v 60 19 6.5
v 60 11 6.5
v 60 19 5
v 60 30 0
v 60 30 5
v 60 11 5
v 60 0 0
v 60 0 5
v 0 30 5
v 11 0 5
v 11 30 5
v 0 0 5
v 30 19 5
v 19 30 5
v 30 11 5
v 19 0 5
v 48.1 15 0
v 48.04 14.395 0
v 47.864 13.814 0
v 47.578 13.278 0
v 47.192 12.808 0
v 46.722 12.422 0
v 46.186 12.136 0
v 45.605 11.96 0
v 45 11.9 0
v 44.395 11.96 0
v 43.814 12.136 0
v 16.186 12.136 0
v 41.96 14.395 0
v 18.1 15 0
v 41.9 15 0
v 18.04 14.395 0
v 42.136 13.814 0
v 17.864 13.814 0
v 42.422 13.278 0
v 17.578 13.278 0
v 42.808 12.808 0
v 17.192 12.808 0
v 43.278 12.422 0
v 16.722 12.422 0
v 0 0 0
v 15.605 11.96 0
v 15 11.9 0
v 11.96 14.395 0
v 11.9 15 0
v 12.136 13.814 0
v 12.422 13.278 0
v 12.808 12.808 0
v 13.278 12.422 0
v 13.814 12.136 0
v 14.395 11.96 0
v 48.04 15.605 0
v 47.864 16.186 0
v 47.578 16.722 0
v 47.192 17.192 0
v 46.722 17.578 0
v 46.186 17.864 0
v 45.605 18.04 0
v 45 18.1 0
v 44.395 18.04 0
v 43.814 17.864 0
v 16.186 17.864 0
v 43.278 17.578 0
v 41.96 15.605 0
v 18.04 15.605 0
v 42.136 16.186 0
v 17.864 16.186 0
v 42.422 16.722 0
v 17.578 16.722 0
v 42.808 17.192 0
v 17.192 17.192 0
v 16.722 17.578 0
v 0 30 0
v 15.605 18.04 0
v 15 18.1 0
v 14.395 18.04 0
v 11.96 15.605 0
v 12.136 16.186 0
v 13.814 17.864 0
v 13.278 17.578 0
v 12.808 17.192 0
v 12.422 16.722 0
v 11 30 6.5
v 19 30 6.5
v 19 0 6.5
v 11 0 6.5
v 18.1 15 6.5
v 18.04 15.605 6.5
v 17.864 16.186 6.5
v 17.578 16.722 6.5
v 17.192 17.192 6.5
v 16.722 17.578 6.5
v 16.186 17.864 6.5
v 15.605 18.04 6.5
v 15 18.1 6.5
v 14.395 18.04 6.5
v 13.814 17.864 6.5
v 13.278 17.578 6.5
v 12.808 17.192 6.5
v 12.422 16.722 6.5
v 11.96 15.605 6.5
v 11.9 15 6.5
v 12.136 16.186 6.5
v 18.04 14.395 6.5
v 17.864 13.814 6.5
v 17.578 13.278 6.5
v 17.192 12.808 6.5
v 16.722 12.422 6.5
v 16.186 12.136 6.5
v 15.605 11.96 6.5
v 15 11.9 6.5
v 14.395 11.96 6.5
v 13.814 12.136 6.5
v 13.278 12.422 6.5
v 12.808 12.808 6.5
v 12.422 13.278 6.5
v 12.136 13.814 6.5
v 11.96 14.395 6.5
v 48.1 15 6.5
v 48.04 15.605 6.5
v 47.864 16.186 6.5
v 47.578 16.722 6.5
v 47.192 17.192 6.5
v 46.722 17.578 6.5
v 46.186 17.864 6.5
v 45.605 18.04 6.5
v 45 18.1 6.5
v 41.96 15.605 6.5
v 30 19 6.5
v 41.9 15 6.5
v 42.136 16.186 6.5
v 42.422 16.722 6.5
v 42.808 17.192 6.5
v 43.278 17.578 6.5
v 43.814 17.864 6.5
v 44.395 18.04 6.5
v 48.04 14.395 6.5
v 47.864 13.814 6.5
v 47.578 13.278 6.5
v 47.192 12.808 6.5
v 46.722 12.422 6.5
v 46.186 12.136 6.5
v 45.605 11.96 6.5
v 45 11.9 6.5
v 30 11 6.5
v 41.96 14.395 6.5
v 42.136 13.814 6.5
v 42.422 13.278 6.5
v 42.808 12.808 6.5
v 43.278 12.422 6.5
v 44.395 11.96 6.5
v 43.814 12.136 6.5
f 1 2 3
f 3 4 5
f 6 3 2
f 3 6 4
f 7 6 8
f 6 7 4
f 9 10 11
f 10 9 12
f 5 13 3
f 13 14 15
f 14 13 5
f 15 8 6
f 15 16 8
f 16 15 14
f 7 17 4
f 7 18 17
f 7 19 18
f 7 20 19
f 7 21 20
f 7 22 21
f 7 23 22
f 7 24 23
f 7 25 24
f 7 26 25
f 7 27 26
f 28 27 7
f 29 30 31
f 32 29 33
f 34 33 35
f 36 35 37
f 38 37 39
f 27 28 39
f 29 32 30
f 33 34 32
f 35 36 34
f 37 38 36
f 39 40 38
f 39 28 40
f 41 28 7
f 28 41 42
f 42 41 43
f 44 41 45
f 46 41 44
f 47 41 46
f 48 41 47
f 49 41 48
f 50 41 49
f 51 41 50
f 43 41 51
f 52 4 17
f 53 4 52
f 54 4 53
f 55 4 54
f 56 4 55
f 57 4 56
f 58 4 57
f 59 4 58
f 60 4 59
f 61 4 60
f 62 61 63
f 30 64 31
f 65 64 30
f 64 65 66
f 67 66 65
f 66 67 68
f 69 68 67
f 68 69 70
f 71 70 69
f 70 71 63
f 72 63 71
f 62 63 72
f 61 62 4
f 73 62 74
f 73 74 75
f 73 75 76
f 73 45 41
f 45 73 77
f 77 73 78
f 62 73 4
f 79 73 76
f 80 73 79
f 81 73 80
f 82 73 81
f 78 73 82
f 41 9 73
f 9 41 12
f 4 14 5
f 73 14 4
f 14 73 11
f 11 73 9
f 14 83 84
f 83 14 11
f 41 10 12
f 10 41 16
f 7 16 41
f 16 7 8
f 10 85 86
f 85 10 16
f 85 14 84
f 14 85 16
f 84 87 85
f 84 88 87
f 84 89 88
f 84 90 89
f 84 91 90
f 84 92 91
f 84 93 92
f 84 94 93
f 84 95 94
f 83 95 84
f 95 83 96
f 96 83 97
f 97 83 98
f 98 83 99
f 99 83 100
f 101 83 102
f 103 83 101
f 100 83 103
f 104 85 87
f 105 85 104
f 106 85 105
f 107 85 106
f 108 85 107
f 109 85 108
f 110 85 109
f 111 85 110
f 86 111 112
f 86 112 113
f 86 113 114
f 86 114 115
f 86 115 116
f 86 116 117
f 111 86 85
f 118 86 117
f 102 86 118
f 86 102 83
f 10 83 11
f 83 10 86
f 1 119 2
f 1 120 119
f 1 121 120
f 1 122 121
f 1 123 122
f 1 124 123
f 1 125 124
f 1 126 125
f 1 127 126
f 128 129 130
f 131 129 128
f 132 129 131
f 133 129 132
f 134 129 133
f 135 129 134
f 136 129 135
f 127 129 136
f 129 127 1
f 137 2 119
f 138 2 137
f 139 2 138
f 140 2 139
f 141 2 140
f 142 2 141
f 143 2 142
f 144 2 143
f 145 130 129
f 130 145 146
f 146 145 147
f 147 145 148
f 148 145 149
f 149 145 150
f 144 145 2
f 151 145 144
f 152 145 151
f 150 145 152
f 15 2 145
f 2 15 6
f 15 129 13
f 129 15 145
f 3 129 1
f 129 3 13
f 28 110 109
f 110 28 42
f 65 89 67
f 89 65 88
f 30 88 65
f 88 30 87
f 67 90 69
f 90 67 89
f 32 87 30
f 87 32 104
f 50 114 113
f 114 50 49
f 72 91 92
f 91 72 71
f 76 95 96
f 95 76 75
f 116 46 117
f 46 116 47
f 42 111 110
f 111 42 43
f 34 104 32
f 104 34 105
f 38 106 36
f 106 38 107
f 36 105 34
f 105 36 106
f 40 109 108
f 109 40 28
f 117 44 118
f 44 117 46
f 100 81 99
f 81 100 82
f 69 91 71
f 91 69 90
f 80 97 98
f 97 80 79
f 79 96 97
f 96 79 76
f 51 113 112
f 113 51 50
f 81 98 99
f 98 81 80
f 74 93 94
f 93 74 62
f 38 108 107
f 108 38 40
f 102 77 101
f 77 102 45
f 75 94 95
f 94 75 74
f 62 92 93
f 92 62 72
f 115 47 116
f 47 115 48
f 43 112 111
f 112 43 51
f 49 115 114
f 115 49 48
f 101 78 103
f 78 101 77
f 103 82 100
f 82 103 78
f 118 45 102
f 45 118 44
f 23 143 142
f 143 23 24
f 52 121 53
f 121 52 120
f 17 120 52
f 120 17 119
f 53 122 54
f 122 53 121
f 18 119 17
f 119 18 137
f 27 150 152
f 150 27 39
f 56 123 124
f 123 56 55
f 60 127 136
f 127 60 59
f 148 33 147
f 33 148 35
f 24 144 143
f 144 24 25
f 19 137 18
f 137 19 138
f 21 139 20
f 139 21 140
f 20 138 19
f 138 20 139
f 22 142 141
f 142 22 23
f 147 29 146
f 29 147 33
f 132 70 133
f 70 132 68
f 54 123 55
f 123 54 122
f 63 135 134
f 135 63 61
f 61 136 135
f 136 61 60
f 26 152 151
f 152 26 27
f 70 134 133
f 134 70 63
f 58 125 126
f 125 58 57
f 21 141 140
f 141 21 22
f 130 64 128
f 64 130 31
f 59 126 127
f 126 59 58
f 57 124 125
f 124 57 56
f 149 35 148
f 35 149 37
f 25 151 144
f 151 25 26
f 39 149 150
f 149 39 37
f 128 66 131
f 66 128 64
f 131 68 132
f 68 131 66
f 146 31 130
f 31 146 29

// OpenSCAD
// RebeliX
//
// corner clutch
// GNU GPL v3
// Martin Neruda <neruda@reprap4u.cz>
// http://www.reprap4u.cz
// Inspired by Rebel II

// Postacuji i 4 mm
base_thickness = 5;

difference(){
	union(){
		cube([60,30,base_thickness], center = false);
		translate([11,0,0])cube([8,30,base_thickness+1.5]);
		translate([60,30/2-4,0])rotate(90,0,0)cube([8,30,base_thickness+1.5]);
		}
		
		translate([11+4,30/2,-0.1])cylinder(h=10,r=3.1,$fn=32);
		translate([60-30/2,30/2,-0.1])cylinder(h=10,r=3.1,$fn=32);
}
